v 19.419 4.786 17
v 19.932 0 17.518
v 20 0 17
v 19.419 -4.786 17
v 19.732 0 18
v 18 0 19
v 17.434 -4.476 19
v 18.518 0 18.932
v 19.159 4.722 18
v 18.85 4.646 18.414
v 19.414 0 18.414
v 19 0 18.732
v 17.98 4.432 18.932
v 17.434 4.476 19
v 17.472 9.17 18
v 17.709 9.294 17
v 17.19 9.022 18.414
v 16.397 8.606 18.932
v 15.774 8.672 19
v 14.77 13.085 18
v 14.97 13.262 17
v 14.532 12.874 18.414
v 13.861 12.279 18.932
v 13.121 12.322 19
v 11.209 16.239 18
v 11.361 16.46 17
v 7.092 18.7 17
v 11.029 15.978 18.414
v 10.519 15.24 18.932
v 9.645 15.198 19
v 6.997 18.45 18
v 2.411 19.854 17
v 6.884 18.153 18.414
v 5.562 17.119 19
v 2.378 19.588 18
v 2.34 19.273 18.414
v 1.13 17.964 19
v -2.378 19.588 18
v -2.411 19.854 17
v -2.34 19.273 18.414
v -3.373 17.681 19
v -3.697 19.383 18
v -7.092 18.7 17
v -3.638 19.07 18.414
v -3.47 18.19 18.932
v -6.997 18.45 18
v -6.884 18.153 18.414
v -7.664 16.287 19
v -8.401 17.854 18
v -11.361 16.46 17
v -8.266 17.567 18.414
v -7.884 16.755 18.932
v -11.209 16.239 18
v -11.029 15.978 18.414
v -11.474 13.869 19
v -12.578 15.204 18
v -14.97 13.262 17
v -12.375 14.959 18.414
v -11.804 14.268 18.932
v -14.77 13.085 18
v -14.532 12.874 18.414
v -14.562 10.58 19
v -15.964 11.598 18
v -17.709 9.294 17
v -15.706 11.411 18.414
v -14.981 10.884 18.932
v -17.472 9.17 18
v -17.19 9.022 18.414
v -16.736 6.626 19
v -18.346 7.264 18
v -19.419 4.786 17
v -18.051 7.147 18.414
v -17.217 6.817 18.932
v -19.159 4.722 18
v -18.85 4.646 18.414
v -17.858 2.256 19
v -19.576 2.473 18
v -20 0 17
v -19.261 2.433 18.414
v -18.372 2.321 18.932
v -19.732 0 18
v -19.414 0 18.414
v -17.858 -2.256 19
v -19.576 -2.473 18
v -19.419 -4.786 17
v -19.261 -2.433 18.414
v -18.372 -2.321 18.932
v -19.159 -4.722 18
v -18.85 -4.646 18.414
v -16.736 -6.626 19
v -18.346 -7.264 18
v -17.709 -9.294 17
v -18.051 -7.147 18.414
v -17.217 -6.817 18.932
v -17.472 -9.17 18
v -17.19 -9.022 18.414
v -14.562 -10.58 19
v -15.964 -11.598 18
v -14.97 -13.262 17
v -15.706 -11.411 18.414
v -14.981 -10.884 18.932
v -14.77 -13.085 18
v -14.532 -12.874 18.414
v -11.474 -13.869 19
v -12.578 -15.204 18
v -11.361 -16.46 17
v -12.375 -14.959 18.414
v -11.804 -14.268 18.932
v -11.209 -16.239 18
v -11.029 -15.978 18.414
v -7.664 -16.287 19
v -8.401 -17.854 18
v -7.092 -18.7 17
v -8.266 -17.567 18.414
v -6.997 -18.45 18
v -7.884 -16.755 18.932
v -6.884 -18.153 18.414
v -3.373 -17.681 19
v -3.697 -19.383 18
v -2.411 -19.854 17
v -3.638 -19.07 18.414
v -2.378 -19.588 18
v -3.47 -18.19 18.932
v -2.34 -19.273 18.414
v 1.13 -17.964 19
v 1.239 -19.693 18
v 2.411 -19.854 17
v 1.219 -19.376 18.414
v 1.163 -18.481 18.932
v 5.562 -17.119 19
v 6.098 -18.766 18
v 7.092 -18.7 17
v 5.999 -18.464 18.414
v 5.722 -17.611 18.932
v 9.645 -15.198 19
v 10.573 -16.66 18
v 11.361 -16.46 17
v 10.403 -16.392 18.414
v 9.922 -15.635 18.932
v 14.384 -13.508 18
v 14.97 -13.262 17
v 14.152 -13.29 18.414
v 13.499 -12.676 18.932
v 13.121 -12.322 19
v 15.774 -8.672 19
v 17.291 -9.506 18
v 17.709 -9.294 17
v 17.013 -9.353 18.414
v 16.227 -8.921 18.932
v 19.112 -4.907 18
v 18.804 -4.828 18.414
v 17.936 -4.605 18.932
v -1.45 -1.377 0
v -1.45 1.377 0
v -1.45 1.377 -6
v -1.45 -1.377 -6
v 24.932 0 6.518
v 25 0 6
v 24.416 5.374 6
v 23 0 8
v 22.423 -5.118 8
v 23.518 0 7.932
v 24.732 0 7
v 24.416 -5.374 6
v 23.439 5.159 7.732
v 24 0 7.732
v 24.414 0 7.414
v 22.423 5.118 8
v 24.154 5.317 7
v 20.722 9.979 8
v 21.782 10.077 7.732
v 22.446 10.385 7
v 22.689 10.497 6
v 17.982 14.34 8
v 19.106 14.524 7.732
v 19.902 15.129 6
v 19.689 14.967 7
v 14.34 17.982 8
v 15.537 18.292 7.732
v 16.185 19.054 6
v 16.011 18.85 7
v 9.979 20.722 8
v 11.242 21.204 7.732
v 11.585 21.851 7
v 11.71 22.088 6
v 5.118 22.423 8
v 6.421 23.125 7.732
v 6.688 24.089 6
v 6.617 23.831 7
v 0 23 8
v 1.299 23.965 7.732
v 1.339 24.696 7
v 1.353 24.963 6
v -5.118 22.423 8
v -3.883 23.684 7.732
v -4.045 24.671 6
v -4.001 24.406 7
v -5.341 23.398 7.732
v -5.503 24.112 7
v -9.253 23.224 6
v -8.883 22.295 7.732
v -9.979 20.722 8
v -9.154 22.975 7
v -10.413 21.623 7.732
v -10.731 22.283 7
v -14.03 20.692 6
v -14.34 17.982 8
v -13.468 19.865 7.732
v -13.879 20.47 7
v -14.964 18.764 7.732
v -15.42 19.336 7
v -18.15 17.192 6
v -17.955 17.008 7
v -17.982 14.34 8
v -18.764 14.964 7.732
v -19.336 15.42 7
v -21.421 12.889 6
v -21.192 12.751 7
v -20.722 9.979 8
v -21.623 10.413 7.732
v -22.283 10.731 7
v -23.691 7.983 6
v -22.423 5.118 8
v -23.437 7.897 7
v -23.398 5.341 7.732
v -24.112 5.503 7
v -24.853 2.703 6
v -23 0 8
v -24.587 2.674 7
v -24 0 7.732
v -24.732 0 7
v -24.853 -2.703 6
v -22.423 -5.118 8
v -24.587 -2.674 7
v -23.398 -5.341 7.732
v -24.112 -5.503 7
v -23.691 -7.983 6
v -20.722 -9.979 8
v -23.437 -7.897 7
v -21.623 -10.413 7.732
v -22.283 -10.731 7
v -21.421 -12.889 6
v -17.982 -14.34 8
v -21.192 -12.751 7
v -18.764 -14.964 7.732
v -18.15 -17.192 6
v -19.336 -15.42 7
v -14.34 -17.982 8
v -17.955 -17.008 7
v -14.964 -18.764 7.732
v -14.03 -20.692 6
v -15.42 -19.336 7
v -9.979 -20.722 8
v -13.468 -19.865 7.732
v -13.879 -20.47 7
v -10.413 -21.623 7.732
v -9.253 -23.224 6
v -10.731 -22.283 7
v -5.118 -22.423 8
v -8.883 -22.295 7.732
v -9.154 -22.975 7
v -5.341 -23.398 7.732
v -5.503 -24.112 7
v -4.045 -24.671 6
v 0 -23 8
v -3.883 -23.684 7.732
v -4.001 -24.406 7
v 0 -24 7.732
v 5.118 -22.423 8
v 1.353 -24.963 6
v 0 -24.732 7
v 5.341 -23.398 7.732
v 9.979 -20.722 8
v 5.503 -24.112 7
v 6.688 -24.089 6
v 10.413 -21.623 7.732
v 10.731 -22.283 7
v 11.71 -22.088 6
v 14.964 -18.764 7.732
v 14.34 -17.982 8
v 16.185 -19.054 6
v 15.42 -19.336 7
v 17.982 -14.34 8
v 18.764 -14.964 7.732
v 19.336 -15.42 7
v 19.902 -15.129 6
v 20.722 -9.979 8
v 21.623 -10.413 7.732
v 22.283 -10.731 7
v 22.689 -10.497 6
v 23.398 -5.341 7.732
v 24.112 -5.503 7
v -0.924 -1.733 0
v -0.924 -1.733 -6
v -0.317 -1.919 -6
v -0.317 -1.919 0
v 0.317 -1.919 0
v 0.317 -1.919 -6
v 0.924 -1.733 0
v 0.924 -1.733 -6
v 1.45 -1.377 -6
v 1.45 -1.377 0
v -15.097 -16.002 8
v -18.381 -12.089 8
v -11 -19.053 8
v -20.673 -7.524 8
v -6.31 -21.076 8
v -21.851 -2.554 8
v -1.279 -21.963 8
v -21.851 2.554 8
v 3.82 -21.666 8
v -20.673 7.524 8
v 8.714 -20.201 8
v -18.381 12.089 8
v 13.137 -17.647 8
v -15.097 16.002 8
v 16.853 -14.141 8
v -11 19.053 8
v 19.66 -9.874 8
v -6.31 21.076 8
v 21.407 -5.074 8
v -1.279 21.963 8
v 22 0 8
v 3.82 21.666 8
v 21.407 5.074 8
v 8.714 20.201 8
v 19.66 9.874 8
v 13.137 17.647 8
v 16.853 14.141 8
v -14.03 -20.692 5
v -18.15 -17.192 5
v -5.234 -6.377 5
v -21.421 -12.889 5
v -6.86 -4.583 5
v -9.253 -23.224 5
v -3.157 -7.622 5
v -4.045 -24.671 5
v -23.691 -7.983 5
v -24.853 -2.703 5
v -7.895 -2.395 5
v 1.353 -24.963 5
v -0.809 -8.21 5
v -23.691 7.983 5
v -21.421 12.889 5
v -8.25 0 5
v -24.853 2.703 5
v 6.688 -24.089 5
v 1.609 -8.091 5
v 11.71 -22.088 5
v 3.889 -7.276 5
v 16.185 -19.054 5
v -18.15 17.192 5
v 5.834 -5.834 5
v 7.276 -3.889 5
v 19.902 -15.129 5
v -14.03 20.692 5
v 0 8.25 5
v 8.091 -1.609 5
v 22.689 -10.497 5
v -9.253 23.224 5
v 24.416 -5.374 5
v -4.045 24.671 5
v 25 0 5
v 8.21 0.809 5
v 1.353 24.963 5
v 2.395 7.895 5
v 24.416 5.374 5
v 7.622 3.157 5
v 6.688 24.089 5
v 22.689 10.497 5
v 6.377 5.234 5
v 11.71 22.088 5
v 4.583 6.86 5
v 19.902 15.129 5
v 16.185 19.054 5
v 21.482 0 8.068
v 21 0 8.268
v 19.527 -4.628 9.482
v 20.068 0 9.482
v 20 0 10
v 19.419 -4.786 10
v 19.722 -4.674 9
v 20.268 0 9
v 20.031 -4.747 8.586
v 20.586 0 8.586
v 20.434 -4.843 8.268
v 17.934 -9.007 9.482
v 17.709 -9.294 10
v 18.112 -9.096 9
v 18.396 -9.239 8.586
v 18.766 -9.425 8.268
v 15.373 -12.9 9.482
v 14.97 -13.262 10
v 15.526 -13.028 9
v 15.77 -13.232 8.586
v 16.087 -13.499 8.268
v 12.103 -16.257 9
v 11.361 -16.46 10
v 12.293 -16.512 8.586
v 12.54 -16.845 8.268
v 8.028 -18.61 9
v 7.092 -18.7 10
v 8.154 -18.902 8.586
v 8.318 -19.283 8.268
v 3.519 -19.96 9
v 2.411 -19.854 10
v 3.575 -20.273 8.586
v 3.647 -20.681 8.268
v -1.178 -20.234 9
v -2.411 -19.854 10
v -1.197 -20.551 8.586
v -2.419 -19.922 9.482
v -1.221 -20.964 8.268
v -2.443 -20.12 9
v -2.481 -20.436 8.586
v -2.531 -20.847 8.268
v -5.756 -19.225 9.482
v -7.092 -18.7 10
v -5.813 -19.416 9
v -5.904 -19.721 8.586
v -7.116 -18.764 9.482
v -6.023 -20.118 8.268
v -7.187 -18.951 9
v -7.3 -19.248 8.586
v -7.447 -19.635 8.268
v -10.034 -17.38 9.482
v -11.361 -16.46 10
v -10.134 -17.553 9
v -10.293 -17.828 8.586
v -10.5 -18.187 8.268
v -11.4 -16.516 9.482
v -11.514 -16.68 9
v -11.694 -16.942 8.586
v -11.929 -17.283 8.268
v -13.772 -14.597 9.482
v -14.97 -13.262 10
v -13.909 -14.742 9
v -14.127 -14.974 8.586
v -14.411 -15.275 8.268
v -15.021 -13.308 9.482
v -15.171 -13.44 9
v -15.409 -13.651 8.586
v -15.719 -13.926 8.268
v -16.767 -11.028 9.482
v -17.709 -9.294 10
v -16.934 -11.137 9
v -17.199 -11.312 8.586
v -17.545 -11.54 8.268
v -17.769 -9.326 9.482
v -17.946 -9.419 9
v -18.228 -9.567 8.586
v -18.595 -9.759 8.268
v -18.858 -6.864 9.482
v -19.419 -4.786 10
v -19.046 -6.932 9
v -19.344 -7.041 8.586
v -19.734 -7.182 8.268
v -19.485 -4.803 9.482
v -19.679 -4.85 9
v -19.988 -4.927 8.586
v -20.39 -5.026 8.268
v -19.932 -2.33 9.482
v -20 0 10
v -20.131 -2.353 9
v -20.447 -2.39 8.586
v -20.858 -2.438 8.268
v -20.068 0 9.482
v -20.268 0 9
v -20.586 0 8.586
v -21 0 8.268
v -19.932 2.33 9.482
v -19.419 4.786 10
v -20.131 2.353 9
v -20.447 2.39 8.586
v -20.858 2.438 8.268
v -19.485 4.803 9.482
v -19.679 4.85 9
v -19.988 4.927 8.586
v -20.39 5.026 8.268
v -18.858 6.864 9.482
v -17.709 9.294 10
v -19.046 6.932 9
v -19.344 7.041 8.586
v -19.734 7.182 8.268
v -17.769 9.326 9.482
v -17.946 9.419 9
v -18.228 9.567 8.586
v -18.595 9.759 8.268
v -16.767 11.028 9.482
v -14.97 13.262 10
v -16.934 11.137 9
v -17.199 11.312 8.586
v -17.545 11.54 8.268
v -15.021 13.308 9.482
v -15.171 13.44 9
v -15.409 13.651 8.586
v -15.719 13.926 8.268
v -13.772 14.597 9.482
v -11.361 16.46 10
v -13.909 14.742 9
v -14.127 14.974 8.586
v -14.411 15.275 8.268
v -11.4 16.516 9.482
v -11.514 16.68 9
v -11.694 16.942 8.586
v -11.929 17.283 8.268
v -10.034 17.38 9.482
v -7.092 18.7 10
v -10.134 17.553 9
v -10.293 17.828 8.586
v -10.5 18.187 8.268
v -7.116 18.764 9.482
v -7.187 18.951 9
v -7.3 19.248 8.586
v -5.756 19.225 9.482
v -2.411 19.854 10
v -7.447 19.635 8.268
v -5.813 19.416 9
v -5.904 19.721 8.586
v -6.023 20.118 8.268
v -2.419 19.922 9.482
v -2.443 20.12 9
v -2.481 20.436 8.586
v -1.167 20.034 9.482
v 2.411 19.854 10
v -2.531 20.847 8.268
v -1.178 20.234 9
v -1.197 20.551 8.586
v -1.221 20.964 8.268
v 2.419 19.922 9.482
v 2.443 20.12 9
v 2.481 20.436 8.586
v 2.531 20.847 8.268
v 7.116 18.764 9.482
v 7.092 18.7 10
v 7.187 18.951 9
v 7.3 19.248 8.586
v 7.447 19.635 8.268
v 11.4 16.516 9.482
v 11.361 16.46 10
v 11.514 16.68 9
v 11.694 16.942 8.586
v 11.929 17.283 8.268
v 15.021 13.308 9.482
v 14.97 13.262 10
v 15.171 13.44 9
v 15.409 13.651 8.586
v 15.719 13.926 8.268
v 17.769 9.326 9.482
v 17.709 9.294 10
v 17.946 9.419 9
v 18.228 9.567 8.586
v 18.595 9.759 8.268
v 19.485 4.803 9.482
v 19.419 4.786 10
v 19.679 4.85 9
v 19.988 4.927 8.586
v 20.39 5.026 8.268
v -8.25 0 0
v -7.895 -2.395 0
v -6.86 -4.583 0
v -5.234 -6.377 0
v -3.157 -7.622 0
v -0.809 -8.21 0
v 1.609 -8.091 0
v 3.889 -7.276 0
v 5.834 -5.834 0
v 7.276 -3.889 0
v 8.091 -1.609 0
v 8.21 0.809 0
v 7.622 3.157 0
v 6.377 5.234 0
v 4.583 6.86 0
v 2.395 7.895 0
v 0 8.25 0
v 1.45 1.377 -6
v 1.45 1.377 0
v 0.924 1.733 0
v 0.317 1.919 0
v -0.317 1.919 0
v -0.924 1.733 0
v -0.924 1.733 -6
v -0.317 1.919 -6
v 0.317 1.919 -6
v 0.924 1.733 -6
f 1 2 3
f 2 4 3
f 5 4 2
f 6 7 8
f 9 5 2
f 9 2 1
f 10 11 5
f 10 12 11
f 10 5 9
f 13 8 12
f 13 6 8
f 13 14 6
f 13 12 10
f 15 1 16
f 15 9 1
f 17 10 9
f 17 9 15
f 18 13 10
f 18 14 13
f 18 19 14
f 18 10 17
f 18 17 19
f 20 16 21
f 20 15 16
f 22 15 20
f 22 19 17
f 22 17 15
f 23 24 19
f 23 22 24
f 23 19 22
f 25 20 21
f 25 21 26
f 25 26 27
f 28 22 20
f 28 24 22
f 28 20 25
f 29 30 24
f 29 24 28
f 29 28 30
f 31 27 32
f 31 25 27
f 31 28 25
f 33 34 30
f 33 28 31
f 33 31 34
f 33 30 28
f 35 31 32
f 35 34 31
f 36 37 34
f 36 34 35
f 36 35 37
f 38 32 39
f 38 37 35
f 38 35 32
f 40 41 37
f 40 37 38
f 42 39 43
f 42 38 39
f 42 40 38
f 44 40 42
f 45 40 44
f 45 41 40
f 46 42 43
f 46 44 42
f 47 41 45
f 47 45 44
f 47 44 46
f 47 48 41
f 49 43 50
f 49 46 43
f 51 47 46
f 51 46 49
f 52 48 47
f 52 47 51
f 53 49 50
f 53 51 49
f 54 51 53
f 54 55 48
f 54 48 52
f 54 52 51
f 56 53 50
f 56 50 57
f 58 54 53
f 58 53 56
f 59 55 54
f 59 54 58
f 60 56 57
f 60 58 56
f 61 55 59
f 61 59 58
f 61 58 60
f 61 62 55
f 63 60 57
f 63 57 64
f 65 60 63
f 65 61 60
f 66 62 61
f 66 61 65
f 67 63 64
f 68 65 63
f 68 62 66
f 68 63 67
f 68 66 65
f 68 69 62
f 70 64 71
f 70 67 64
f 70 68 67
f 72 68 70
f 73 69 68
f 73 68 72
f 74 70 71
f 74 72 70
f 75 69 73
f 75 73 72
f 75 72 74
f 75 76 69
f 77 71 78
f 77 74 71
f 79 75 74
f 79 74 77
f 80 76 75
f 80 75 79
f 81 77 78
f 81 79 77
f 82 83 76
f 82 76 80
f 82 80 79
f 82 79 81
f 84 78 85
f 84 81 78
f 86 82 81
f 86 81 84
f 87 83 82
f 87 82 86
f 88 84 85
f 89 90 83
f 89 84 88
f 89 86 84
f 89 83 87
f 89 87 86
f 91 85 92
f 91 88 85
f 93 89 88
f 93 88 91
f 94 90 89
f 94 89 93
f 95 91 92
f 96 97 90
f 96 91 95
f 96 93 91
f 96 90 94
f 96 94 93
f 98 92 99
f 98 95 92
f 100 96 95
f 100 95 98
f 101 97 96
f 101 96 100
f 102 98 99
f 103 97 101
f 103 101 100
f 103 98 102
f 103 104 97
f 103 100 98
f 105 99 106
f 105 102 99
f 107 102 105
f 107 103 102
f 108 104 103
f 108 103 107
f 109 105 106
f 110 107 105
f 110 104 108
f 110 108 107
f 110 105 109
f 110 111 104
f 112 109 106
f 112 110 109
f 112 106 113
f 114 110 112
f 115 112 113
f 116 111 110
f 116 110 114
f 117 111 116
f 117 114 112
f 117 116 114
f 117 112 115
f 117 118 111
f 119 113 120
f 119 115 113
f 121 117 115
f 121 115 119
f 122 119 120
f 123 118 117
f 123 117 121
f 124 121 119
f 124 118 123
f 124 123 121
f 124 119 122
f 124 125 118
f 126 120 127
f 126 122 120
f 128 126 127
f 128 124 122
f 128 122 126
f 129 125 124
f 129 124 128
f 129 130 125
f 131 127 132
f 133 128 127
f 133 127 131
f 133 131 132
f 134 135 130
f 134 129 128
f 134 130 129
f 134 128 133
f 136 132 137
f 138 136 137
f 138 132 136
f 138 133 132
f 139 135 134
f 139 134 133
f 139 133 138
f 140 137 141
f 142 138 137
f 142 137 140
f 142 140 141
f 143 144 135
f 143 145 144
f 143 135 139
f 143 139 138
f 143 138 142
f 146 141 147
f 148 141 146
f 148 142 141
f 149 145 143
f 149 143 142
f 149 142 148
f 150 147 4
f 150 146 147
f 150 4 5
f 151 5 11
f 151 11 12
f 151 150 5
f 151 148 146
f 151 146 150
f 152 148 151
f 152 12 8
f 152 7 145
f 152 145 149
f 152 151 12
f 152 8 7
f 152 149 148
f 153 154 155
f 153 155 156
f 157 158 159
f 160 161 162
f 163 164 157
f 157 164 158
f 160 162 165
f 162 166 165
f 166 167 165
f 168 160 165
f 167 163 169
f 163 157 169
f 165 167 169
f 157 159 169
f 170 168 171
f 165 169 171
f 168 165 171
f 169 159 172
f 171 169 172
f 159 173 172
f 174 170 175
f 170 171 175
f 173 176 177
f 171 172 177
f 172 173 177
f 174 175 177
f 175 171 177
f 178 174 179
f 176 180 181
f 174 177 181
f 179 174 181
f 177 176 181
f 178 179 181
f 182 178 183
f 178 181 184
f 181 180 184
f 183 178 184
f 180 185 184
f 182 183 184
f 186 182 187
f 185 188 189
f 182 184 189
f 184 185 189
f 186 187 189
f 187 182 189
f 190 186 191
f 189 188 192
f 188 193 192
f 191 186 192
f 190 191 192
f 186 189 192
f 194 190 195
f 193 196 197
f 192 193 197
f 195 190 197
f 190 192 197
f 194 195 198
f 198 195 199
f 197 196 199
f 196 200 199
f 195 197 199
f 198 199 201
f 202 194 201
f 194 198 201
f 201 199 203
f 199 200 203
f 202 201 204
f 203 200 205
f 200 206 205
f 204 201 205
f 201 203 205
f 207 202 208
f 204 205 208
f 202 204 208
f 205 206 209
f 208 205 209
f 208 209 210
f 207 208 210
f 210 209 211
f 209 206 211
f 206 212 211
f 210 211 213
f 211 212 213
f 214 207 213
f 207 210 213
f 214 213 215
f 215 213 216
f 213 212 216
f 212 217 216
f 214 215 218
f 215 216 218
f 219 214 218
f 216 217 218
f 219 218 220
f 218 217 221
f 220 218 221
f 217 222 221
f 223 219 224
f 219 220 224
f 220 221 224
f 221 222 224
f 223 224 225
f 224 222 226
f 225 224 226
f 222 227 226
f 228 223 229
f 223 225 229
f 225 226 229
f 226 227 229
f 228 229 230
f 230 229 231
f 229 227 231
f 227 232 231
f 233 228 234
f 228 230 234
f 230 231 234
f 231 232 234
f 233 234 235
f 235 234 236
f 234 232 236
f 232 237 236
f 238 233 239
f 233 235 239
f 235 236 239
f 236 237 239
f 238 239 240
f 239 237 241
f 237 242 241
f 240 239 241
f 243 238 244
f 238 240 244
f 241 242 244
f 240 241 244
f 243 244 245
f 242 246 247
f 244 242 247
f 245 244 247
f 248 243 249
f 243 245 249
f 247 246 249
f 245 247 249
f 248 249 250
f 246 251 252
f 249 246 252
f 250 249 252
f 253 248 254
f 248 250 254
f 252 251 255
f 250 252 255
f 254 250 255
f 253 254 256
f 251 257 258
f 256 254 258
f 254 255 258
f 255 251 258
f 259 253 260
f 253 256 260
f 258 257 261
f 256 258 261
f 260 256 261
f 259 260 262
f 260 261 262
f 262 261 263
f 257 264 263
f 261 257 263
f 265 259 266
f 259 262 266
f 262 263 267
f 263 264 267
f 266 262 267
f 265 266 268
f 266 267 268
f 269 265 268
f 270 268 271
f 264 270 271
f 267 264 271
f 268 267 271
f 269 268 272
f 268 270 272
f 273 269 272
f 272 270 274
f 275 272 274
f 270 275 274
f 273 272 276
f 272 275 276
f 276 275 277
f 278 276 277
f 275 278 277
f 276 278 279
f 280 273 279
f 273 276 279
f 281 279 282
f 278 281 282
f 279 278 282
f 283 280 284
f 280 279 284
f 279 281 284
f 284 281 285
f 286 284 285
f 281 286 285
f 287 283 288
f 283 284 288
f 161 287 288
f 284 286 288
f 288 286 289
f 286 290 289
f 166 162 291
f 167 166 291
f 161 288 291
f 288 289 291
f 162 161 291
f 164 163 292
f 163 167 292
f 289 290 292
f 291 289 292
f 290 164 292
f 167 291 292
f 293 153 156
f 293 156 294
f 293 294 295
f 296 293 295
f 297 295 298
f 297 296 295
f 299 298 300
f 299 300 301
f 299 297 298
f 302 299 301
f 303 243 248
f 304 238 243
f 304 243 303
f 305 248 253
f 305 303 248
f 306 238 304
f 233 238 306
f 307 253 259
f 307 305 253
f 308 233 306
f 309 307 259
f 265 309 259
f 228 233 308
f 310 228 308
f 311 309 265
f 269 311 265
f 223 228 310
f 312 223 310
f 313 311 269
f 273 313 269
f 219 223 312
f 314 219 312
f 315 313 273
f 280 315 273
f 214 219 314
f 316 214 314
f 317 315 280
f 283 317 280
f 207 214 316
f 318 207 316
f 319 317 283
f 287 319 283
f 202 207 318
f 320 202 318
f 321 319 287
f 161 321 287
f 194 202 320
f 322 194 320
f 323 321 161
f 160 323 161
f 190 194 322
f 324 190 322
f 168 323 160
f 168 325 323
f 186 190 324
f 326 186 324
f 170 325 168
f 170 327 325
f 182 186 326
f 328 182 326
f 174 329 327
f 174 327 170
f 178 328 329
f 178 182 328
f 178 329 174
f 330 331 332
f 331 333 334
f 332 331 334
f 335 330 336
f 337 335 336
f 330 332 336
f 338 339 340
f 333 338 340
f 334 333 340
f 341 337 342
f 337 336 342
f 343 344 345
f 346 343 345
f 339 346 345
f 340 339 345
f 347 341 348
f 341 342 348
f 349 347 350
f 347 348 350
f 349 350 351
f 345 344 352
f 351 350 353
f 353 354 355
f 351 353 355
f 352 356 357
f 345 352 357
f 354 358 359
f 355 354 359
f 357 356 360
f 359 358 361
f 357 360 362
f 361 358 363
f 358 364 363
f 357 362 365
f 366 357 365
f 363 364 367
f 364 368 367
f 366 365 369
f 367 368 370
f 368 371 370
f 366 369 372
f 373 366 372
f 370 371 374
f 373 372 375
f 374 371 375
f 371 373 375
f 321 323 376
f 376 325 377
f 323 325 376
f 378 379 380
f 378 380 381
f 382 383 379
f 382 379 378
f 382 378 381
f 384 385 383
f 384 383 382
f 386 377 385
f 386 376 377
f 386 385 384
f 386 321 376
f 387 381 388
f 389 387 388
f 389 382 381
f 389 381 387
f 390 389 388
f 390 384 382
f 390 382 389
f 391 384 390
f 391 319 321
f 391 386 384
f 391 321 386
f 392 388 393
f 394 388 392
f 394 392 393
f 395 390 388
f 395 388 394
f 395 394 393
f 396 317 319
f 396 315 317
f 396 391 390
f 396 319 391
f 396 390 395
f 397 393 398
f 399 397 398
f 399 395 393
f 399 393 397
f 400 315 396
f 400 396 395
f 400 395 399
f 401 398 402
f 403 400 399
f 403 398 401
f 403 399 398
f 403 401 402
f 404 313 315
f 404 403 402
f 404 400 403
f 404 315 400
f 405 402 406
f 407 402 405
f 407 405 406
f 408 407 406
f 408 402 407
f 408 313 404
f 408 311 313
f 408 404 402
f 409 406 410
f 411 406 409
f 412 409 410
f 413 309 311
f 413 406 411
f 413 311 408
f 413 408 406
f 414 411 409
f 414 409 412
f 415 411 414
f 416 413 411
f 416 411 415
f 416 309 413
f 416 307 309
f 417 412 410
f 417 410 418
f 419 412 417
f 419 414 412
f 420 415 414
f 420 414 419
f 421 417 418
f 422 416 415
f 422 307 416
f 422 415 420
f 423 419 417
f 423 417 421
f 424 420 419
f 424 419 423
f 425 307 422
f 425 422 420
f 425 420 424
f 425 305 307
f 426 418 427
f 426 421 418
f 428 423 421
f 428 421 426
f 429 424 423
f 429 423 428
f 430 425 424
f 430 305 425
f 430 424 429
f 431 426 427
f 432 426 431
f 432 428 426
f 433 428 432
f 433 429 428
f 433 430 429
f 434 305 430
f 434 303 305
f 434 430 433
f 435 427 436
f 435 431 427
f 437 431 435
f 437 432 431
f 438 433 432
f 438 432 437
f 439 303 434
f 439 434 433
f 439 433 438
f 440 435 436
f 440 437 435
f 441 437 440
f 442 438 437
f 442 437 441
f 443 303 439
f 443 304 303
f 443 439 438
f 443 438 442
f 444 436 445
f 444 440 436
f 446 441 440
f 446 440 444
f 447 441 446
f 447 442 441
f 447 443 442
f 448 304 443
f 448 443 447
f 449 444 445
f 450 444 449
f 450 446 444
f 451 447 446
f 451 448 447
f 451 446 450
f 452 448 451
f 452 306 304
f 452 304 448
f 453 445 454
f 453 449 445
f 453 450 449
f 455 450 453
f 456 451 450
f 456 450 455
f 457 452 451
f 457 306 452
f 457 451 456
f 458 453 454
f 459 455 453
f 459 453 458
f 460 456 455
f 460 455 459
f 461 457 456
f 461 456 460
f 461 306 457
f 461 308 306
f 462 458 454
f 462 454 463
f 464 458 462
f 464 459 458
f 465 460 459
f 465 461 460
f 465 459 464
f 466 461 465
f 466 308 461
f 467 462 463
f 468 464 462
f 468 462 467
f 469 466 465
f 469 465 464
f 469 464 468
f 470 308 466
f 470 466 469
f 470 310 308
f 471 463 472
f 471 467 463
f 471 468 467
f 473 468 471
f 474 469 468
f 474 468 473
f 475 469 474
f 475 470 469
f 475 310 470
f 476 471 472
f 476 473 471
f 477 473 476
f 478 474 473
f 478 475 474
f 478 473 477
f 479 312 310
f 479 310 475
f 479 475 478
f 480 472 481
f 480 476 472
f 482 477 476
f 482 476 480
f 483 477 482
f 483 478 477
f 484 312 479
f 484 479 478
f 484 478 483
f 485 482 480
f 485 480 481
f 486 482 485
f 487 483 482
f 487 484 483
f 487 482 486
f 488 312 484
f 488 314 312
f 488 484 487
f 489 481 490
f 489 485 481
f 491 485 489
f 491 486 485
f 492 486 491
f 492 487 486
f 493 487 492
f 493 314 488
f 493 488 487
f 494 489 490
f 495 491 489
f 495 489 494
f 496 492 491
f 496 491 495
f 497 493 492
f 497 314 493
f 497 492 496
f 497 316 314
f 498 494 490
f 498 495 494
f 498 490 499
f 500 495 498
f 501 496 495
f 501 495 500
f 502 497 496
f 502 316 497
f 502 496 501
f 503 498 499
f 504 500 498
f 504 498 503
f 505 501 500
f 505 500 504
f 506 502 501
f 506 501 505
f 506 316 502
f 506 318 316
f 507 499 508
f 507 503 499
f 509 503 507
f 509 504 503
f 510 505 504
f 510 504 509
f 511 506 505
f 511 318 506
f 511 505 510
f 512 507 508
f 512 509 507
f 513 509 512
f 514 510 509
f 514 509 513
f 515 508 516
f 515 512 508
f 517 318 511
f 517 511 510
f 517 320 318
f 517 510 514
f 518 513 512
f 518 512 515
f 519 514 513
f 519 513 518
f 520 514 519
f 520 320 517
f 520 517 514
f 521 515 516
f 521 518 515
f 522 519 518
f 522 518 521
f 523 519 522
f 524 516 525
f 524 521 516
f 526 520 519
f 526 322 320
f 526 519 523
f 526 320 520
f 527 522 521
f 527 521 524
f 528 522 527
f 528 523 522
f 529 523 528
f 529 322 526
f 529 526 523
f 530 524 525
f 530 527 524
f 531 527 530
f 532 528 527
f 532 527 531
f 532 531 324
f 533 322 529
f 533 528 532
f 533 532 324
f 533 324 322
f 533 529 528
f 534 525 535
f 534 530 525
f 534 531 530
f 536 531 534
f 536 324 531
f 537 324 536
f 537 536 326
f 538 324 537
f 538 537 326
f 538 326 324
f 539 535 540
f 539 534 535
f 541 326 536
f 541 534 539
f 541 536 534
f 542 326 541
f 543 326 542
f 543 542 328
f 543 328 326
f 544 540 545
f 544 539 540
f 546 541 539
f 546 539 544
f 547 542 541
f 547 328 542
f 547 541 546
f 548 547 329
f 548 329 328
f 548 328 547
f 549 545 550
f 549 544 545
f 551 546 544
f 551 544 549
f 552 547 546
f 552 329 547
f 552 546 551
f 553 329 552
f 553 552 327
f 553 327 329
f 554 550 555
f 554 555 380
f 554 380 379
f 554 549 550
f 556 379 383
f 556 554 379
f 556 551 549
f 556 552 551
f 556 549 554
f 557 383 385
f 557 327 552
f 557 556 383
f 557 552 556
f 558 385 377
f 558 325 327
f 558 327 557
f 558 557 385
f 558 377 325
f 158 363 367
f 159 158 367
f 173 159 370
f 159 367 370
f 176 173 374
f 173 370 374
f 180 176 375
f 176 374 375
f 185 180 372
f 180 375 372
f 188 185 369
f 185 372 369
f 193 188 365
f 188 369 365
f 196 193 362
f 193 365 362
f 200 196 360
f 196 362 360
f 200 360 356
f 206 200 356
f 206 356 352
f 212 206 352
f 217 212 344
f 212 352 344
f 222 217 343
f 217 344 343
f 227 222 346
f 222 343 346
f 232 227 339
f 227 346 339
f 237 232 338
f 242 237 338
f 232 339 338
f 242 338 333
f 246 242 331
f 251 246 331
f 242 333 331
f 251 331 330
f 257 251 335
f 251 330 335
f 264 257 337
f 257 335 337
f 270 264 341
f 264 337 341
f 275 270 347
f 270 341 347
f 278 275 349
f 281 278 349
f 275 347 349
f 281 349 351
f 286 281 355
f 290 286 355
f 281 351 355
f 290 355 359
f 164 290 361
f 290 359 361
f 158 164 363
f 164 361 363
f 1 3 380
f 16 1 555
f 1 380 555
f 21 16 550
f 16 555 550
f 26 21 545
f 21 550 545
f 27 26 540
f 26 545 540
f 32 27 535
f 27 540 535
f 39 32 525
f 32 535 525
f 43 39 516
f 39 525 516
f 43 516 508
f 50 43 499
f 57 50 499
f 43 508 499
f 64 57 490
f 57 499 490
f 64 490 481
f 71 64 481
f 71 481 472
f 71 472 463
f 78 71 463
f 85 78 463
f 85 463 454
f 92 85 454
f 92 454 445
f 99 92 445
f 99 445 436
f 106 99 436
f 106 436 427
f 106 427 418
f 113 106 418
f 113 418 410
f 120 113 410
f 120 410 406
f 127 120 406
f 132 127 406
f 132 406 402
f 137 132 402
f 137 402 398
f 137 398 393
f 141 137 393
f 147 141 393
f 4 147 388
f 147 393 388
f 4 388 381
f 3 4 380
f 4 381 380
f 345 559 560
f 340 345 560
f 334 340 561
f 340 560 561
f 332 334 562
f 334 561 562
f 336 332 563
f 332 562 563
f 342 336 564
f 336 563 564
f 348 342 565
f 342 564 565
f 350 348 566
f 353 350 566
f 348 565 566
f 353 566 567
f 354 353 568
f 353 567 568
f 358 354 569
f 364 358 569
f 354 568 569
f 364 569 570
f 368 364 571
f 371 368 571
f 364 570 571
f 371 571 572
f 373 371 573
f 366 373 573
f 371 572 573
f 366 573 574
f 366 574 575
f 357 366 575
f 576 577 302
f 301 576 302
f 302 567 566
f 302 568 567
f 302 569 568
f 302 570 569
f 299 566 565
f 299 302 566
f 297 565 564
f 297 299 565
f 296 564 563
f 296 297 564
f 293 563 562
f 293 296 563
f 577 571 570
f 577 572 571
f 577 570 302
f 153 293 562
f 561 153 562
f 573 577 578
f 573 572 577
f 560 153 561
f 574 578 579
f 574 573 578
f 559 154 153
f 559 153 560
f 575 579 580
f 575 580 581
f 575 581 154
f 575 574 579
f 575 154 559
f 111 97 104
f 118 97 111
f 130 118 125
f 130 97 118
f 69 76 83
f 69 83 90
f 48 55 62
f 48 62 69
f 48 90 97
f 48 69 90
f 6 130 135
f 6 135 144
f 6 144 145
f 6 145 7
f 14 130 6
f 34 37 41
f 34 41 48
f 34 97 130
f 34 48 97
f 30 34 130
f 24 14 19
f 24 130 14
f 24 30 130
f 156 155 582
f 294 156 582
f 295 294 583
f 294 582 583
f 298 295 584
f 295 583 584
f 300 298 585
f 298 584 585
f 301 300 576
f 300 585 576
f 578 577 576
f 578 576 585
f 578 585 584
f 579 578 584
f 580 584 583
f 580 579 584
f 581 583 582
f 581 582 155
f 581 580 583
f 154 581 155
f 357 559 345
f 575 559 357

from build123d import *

# Parameters (mm, degrees)
PAD_DEPTH    = 6
PAD001_DEPTH = 5
SKETCH002_R  = 25
PAD002_DEPTH = 3
SKETCH003_R  = 20
PAD003_DEPTH = 12
FILLET_R     = 2


with BuildPart() as part:
    # Sketch → Pad (new body)
    with BuildSketch(Plane.XY):
        with BuildLine():
            Line((-1.45, 1.377498), (-1.45, -1.377498))
            ThreePointArc((-1.45, -1.377498), (0, -1.942662), (1.45, -1.377498))
            Line((1.45, 1.377498), (1.45, -1.377498))
            ThreePointArc((1.45, 1.377498), (0, 1.942662), (-1.45, 1.377498))
        make_face()
    extrude(amount=-PAD_DEPTH)

    # Sketch001 → Pad001 (join)
    with BuildSketch(Plane.XY):
        with BuildLine():
            Line((-8.25, 0), (0, 8.25))
            ThreePointArc((-8.25, 0), (5.833631, -5.833631), (0, 8.25))
        make_face()
    extrude(amount=PAD001_DEPTH)

    # Sketch002 → Pad002 (join)
    with BuildSketch(Plane.XY.offset(5)):
        Circle(SKETCH002_R)
    extrude(amount=PAD002_DEPTH)

    # Sketch003 → Pad003 (join)
    with BuildSketch(Plane.XY.offset(7)):
        Circle(SKETCH003_R)
    extrude(amount=PAD003_DEPTH)

    # Fillet
    fillet_edges = [part.edges().sort_by_distance(p)[0] for p in [
        (-20, 0, 19),
        (-20, 0, 8),
        (-25, 0, 8),
    ]]
    fillet(fillet_edges, radius=FILLET_R)


solid = part.part
